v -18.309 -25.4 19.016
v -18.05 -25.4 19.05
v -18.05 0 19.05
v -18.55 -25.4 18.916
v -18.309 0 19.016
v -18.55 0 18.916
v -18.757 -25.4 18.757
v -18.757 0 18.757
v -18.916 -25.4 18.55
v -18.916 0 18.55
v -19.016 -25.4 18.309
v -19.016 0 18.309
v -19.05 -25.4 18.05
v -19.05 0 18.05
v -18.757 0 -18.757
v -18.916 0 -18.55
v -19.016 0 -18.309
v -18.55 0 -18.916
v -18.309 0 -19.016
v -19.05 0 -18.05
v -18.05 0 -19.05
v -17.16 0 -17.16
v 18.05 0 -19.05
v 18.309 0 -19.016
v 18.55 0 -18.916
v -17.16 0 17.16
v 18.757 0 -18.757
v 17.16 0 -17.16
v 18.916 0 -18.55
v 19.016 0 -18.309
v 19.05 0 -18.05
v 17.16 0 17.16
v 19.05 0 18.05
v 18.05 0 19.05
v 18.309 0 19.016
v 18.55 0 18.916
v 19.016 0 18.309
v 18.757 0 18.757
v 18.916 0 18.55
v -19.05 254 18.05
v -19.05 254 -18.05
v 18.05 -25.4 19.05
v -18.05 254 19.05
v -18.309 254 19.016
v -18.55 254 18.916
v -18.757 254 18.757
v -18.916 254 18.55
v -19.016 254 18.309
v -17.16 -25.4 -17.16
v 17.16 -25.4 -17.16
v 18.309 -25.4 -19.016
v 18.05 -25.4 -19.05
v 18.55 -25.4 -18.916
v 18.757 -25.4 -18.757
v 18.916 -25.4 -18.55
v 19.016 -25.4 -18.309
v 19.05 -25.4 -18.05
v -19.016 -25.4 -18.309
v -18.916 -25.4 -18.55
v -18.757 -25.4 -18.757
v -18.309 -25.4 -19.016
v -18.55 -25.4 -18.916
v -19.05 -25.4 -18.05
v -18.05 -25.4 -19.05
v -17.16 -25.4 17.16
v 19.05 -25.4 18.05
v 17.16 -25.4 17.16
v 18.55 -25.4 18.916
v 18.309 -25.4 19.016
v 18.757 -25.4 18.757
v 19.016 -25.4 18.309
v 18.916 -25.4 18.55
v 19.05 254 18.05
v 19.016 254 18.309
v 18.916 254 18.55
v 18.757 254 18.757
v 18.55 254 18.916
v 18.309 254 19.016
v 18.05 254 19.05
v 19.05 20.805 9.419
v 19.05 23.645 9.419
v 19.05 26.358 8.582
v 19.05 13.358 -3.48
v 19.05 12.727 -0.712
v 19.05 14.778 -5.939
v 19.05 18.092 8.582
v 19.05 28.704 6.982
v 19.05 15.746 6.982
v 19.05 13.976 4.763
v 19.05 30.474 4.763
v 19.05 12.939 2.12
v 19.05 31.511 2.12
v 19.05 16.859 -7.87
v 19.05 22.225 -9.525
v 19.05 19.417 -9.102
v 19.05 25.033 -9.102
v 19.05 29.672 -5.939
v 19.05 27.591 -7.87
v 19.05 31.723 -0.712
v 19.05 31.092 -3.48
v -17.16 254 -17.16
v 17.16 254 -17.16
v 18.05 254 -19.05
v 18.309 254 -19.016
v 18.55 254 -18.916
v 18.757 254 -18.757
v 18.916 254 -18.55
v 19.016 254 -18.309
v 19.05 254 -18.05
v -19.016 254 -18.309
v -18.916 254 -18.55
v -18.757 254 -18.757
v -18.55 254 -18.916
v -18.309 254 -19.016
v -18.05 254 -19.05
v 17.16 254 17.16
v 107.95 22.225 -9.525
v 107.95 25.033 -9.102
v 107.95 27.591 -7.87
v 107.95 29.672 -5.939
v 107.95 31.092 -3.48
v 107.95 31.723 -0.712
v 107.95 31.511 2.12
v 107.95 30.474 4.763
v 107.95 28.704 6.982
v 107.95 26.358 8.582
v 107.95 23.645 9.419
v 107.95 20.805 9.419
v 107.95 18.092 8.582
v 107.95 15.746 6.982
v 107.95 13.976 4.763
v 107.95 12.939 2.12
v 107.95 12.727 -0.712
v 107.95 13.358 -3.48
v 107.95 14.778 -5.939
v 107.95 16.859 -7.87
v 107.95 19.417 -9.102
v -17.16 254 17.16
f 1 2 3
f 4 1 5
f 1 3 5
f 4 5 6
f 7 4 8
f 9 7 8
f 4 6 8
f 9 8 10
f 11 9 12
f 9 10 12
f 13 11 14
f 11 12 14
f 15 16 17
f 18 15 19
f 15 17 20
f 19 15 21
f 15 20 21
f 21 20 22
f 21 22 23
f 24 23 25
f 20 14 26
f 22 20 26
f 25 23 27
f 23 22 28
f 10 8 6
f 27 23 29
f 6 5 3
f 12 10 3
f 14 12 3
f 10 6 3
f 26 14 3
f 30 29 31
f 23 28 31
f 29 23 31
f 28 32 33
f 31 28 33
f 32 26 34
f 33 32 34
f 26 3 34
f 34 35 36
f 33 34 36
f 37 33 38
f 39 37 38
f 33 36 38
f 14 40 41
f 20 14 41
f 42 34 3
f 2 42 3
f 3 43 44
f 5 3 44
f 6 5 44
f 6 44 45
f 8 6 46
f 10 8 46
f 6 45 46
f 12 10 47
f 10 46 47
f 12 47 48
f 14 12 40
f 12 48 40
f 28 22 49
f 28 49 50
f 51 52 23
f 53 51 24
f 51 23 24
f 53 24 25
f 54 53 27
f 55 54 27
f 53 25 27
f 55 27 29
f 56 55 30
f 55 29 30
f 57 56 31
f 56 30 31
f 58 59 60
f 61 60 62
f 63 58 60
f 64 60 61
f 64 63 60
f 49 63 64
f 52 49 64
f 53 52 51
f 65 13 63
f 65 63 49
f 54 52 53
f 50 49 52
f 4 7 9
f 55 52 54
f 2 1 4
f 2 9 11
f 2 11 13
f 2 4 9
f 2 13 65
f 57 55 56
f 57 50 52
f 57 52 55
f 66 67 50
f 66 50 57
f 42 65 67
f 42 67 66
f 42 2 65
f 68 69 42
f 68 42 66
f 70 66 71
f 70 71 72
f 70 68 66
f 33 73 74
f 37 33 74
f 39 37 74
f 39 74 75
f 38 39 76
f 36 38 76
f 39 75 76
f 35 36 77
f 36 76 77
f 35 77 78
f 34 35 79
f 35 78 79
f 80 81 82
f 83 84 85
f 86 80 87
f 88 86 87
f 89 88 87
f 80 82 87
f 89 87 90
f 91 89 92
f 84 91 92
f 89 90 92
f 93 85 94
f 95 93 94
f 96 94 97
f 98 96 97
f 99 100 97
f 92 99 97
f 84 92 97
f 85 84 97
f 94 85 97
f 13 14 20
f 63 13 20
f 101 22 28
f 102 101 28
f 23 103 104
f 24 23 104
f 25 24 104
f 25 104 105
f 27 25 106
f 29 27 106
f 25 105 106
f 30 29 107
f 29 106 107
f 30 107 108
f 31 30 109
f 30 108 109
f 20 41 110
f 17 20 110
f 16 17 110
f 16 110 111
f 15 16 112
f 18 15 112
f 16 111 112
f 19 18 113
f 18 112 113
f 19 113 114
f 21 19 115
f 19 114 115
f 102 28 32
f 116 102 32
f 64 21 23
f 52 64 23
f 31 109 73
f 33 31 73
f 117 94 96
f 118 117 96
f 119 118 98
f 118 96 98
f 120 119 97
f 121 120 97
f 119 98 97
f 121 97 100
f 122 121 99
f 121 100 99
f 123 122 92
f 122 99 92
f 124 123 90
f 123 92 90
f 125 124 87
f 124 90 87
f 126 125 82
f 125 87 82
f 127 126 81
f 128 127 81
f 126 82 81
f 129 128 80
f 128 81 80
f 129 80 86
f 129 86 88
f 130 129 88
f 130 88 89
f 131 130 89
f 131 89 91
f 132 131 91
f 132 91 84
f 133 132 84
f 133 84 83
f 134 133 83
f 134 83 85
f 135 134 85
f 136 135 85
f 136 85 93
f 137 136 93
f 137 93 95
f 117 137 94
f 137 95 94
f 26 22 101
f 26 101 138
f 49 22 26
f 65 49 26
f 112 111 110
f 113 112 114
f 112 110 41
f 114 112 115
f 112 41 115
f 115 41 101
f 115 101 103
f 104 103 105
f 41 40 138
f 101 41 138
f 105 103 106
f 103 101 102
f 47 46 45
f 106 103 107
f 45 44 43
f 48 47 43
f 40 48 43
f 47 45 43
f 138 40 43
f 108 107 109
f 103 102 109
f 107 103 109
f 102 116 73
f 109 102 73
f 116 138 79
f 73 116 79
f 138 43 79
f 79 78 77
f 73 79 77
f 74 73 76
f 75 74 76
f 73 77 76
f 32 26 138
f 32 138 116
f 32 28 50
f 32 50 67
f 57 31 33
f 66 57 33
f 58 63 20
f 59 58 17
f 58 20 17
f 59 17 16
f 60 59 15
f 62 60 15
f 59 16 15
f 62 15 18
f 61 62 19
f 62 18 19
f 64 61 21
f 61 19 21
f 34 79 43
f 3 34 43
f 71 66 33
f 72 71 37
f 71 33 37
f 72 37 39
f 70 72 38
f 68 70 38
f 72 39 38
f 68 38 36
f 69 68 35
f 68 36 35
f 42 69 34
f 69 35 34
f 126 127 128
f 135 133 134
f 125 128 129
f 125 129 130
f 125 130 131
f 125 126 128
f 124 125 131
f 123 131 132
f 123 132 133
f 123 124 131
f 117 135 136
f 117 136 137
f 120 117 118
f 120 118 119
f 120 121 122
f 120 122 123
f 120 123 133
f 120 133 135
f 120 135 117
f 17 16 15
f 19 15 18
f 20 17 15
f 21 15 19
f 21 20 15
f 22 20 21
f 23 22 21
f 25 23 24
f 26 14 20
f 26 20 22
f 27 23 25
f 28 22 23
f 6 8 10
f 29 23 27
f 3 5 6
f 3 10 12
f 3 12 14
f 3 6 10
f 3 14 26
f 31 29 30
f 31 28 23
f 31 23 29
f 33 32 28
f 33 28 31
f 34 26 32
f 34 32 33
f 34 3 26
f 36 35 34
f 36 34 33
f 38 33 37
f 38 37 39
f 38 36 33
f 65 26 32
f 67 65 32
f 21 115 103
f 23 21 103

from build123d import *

# Parameters (mm, degrees)
CROQUIS11_W                         = 34.32
CROQUIS11_H                         = 34.32
PTR_PTR_1_5X1_5_CALIBRE14_1_DEPTH   = 254
CROQUIS11_ON_SEGMENT_2_W            = 34.32
CROQUIS11_ON_SEGMENT_2_H            = 34.32
PTR_PTR_1_5X1_5_CALIBRE14_1_2_DEPTH = 25.4
CROQUIS13_R                         = 9.525
SALIENTE_EXTRUIR1_DEPTH             = 88.9


with BuildPart() as part:
    # Croquis11 → Ptr PTR_1.5X1.5_CALIBRE14(1) (new body)
    with BuildSketch(Plane.XZ.offset(-254)):
        with BuildLine():
            Line((-18.05, -19.05), (18.05, -19.05))
            ThreePointArc((18.05, -19.05), (18.757106781, -18.757106781), (19.05, -18.05))
            Line((19.05, -18.05), (19.05, 18.05))
            ThreePointArc((19.05, 18.05), (18.757106781, 18.757106781), (18.05, 19.05))
            Line((18.05, 19.05), (-18.05, 19.05))
            ThreePointArc((-18.05, 19.05), (-18.757106781, 18.757106781), (-19.05, 18.05))
            Line((-19.05, 18.05), (-19.05, -18.05))
            ThreePointArc((-19.05, -18.05), (-18.757106781, -18.757106781), (-18.05, -19.05))
        make_face()
        Rectangle(CROQUIS11_W, CROQUIS11_H, mode=Mode.SUBTRACT)
    extrude(amount=PTR_PTR_1_5X1_5_CALIBRE14_1_DEPTH)


with BuildPart() as body_2:
    # Croquis11 on segment 2 (carried to segment 2) → Ptr PTR_1.5X1.5_CALIBRE14_1 2 (new body)
    with BuildSketch(Plane.XZ):
        with BuildLine():
            Line((-18.05, -19.05), (18.05, -19.05))
            ThreePointArc((18.05, -19.05), (18.757106781, -18.757106781), (19.05, -18.05))
            Line((19.05, -18.05), (19.05, 18.05))
            ThreePointArc((19.05, 18.05), (18.757106781, 18.757106781), (18.05, 19.05))
            Line((18.05, 19.05), (-18.05, 19.05))
            ThreePointArc((-18.05, 19.05), (-18.757106781, 18.757106781), (-19.05, 18.05))
            Line((-19.05, 18.05), (-19.05, -18.05))
            ThreePointArc((-19.05, -18.05), (-18.757106781, -18.757106781), (-18.05, -19.05))
        make_face()
        Rectangle(CROQUIS11_ON_SEGMENT_2_W, CROQUIS11_ON_SEGMENT_2_H, mode=Mode.SUBTRACT)
    extrude(amount=PTR_PTR_1_5X1_5_CALIBRE14_1_2_DEPTH)


with BuildPart() as body_3:
    # Croquis13 → Saliente-Extruir1 (new body)
    with BuildSketch(Plane(origin=(19.05, 0, 0), x_dir=(0, 0, -1), z_dir=(1, 0, 0))):
        with Locations((0, 22.225)):
            Circle(CROQUIS13_R)
    extrude(amount=SALIENTE_EXTRUIR1_DEPTH)


solid = Compound([part.part, body_2.part, body_3.part])
